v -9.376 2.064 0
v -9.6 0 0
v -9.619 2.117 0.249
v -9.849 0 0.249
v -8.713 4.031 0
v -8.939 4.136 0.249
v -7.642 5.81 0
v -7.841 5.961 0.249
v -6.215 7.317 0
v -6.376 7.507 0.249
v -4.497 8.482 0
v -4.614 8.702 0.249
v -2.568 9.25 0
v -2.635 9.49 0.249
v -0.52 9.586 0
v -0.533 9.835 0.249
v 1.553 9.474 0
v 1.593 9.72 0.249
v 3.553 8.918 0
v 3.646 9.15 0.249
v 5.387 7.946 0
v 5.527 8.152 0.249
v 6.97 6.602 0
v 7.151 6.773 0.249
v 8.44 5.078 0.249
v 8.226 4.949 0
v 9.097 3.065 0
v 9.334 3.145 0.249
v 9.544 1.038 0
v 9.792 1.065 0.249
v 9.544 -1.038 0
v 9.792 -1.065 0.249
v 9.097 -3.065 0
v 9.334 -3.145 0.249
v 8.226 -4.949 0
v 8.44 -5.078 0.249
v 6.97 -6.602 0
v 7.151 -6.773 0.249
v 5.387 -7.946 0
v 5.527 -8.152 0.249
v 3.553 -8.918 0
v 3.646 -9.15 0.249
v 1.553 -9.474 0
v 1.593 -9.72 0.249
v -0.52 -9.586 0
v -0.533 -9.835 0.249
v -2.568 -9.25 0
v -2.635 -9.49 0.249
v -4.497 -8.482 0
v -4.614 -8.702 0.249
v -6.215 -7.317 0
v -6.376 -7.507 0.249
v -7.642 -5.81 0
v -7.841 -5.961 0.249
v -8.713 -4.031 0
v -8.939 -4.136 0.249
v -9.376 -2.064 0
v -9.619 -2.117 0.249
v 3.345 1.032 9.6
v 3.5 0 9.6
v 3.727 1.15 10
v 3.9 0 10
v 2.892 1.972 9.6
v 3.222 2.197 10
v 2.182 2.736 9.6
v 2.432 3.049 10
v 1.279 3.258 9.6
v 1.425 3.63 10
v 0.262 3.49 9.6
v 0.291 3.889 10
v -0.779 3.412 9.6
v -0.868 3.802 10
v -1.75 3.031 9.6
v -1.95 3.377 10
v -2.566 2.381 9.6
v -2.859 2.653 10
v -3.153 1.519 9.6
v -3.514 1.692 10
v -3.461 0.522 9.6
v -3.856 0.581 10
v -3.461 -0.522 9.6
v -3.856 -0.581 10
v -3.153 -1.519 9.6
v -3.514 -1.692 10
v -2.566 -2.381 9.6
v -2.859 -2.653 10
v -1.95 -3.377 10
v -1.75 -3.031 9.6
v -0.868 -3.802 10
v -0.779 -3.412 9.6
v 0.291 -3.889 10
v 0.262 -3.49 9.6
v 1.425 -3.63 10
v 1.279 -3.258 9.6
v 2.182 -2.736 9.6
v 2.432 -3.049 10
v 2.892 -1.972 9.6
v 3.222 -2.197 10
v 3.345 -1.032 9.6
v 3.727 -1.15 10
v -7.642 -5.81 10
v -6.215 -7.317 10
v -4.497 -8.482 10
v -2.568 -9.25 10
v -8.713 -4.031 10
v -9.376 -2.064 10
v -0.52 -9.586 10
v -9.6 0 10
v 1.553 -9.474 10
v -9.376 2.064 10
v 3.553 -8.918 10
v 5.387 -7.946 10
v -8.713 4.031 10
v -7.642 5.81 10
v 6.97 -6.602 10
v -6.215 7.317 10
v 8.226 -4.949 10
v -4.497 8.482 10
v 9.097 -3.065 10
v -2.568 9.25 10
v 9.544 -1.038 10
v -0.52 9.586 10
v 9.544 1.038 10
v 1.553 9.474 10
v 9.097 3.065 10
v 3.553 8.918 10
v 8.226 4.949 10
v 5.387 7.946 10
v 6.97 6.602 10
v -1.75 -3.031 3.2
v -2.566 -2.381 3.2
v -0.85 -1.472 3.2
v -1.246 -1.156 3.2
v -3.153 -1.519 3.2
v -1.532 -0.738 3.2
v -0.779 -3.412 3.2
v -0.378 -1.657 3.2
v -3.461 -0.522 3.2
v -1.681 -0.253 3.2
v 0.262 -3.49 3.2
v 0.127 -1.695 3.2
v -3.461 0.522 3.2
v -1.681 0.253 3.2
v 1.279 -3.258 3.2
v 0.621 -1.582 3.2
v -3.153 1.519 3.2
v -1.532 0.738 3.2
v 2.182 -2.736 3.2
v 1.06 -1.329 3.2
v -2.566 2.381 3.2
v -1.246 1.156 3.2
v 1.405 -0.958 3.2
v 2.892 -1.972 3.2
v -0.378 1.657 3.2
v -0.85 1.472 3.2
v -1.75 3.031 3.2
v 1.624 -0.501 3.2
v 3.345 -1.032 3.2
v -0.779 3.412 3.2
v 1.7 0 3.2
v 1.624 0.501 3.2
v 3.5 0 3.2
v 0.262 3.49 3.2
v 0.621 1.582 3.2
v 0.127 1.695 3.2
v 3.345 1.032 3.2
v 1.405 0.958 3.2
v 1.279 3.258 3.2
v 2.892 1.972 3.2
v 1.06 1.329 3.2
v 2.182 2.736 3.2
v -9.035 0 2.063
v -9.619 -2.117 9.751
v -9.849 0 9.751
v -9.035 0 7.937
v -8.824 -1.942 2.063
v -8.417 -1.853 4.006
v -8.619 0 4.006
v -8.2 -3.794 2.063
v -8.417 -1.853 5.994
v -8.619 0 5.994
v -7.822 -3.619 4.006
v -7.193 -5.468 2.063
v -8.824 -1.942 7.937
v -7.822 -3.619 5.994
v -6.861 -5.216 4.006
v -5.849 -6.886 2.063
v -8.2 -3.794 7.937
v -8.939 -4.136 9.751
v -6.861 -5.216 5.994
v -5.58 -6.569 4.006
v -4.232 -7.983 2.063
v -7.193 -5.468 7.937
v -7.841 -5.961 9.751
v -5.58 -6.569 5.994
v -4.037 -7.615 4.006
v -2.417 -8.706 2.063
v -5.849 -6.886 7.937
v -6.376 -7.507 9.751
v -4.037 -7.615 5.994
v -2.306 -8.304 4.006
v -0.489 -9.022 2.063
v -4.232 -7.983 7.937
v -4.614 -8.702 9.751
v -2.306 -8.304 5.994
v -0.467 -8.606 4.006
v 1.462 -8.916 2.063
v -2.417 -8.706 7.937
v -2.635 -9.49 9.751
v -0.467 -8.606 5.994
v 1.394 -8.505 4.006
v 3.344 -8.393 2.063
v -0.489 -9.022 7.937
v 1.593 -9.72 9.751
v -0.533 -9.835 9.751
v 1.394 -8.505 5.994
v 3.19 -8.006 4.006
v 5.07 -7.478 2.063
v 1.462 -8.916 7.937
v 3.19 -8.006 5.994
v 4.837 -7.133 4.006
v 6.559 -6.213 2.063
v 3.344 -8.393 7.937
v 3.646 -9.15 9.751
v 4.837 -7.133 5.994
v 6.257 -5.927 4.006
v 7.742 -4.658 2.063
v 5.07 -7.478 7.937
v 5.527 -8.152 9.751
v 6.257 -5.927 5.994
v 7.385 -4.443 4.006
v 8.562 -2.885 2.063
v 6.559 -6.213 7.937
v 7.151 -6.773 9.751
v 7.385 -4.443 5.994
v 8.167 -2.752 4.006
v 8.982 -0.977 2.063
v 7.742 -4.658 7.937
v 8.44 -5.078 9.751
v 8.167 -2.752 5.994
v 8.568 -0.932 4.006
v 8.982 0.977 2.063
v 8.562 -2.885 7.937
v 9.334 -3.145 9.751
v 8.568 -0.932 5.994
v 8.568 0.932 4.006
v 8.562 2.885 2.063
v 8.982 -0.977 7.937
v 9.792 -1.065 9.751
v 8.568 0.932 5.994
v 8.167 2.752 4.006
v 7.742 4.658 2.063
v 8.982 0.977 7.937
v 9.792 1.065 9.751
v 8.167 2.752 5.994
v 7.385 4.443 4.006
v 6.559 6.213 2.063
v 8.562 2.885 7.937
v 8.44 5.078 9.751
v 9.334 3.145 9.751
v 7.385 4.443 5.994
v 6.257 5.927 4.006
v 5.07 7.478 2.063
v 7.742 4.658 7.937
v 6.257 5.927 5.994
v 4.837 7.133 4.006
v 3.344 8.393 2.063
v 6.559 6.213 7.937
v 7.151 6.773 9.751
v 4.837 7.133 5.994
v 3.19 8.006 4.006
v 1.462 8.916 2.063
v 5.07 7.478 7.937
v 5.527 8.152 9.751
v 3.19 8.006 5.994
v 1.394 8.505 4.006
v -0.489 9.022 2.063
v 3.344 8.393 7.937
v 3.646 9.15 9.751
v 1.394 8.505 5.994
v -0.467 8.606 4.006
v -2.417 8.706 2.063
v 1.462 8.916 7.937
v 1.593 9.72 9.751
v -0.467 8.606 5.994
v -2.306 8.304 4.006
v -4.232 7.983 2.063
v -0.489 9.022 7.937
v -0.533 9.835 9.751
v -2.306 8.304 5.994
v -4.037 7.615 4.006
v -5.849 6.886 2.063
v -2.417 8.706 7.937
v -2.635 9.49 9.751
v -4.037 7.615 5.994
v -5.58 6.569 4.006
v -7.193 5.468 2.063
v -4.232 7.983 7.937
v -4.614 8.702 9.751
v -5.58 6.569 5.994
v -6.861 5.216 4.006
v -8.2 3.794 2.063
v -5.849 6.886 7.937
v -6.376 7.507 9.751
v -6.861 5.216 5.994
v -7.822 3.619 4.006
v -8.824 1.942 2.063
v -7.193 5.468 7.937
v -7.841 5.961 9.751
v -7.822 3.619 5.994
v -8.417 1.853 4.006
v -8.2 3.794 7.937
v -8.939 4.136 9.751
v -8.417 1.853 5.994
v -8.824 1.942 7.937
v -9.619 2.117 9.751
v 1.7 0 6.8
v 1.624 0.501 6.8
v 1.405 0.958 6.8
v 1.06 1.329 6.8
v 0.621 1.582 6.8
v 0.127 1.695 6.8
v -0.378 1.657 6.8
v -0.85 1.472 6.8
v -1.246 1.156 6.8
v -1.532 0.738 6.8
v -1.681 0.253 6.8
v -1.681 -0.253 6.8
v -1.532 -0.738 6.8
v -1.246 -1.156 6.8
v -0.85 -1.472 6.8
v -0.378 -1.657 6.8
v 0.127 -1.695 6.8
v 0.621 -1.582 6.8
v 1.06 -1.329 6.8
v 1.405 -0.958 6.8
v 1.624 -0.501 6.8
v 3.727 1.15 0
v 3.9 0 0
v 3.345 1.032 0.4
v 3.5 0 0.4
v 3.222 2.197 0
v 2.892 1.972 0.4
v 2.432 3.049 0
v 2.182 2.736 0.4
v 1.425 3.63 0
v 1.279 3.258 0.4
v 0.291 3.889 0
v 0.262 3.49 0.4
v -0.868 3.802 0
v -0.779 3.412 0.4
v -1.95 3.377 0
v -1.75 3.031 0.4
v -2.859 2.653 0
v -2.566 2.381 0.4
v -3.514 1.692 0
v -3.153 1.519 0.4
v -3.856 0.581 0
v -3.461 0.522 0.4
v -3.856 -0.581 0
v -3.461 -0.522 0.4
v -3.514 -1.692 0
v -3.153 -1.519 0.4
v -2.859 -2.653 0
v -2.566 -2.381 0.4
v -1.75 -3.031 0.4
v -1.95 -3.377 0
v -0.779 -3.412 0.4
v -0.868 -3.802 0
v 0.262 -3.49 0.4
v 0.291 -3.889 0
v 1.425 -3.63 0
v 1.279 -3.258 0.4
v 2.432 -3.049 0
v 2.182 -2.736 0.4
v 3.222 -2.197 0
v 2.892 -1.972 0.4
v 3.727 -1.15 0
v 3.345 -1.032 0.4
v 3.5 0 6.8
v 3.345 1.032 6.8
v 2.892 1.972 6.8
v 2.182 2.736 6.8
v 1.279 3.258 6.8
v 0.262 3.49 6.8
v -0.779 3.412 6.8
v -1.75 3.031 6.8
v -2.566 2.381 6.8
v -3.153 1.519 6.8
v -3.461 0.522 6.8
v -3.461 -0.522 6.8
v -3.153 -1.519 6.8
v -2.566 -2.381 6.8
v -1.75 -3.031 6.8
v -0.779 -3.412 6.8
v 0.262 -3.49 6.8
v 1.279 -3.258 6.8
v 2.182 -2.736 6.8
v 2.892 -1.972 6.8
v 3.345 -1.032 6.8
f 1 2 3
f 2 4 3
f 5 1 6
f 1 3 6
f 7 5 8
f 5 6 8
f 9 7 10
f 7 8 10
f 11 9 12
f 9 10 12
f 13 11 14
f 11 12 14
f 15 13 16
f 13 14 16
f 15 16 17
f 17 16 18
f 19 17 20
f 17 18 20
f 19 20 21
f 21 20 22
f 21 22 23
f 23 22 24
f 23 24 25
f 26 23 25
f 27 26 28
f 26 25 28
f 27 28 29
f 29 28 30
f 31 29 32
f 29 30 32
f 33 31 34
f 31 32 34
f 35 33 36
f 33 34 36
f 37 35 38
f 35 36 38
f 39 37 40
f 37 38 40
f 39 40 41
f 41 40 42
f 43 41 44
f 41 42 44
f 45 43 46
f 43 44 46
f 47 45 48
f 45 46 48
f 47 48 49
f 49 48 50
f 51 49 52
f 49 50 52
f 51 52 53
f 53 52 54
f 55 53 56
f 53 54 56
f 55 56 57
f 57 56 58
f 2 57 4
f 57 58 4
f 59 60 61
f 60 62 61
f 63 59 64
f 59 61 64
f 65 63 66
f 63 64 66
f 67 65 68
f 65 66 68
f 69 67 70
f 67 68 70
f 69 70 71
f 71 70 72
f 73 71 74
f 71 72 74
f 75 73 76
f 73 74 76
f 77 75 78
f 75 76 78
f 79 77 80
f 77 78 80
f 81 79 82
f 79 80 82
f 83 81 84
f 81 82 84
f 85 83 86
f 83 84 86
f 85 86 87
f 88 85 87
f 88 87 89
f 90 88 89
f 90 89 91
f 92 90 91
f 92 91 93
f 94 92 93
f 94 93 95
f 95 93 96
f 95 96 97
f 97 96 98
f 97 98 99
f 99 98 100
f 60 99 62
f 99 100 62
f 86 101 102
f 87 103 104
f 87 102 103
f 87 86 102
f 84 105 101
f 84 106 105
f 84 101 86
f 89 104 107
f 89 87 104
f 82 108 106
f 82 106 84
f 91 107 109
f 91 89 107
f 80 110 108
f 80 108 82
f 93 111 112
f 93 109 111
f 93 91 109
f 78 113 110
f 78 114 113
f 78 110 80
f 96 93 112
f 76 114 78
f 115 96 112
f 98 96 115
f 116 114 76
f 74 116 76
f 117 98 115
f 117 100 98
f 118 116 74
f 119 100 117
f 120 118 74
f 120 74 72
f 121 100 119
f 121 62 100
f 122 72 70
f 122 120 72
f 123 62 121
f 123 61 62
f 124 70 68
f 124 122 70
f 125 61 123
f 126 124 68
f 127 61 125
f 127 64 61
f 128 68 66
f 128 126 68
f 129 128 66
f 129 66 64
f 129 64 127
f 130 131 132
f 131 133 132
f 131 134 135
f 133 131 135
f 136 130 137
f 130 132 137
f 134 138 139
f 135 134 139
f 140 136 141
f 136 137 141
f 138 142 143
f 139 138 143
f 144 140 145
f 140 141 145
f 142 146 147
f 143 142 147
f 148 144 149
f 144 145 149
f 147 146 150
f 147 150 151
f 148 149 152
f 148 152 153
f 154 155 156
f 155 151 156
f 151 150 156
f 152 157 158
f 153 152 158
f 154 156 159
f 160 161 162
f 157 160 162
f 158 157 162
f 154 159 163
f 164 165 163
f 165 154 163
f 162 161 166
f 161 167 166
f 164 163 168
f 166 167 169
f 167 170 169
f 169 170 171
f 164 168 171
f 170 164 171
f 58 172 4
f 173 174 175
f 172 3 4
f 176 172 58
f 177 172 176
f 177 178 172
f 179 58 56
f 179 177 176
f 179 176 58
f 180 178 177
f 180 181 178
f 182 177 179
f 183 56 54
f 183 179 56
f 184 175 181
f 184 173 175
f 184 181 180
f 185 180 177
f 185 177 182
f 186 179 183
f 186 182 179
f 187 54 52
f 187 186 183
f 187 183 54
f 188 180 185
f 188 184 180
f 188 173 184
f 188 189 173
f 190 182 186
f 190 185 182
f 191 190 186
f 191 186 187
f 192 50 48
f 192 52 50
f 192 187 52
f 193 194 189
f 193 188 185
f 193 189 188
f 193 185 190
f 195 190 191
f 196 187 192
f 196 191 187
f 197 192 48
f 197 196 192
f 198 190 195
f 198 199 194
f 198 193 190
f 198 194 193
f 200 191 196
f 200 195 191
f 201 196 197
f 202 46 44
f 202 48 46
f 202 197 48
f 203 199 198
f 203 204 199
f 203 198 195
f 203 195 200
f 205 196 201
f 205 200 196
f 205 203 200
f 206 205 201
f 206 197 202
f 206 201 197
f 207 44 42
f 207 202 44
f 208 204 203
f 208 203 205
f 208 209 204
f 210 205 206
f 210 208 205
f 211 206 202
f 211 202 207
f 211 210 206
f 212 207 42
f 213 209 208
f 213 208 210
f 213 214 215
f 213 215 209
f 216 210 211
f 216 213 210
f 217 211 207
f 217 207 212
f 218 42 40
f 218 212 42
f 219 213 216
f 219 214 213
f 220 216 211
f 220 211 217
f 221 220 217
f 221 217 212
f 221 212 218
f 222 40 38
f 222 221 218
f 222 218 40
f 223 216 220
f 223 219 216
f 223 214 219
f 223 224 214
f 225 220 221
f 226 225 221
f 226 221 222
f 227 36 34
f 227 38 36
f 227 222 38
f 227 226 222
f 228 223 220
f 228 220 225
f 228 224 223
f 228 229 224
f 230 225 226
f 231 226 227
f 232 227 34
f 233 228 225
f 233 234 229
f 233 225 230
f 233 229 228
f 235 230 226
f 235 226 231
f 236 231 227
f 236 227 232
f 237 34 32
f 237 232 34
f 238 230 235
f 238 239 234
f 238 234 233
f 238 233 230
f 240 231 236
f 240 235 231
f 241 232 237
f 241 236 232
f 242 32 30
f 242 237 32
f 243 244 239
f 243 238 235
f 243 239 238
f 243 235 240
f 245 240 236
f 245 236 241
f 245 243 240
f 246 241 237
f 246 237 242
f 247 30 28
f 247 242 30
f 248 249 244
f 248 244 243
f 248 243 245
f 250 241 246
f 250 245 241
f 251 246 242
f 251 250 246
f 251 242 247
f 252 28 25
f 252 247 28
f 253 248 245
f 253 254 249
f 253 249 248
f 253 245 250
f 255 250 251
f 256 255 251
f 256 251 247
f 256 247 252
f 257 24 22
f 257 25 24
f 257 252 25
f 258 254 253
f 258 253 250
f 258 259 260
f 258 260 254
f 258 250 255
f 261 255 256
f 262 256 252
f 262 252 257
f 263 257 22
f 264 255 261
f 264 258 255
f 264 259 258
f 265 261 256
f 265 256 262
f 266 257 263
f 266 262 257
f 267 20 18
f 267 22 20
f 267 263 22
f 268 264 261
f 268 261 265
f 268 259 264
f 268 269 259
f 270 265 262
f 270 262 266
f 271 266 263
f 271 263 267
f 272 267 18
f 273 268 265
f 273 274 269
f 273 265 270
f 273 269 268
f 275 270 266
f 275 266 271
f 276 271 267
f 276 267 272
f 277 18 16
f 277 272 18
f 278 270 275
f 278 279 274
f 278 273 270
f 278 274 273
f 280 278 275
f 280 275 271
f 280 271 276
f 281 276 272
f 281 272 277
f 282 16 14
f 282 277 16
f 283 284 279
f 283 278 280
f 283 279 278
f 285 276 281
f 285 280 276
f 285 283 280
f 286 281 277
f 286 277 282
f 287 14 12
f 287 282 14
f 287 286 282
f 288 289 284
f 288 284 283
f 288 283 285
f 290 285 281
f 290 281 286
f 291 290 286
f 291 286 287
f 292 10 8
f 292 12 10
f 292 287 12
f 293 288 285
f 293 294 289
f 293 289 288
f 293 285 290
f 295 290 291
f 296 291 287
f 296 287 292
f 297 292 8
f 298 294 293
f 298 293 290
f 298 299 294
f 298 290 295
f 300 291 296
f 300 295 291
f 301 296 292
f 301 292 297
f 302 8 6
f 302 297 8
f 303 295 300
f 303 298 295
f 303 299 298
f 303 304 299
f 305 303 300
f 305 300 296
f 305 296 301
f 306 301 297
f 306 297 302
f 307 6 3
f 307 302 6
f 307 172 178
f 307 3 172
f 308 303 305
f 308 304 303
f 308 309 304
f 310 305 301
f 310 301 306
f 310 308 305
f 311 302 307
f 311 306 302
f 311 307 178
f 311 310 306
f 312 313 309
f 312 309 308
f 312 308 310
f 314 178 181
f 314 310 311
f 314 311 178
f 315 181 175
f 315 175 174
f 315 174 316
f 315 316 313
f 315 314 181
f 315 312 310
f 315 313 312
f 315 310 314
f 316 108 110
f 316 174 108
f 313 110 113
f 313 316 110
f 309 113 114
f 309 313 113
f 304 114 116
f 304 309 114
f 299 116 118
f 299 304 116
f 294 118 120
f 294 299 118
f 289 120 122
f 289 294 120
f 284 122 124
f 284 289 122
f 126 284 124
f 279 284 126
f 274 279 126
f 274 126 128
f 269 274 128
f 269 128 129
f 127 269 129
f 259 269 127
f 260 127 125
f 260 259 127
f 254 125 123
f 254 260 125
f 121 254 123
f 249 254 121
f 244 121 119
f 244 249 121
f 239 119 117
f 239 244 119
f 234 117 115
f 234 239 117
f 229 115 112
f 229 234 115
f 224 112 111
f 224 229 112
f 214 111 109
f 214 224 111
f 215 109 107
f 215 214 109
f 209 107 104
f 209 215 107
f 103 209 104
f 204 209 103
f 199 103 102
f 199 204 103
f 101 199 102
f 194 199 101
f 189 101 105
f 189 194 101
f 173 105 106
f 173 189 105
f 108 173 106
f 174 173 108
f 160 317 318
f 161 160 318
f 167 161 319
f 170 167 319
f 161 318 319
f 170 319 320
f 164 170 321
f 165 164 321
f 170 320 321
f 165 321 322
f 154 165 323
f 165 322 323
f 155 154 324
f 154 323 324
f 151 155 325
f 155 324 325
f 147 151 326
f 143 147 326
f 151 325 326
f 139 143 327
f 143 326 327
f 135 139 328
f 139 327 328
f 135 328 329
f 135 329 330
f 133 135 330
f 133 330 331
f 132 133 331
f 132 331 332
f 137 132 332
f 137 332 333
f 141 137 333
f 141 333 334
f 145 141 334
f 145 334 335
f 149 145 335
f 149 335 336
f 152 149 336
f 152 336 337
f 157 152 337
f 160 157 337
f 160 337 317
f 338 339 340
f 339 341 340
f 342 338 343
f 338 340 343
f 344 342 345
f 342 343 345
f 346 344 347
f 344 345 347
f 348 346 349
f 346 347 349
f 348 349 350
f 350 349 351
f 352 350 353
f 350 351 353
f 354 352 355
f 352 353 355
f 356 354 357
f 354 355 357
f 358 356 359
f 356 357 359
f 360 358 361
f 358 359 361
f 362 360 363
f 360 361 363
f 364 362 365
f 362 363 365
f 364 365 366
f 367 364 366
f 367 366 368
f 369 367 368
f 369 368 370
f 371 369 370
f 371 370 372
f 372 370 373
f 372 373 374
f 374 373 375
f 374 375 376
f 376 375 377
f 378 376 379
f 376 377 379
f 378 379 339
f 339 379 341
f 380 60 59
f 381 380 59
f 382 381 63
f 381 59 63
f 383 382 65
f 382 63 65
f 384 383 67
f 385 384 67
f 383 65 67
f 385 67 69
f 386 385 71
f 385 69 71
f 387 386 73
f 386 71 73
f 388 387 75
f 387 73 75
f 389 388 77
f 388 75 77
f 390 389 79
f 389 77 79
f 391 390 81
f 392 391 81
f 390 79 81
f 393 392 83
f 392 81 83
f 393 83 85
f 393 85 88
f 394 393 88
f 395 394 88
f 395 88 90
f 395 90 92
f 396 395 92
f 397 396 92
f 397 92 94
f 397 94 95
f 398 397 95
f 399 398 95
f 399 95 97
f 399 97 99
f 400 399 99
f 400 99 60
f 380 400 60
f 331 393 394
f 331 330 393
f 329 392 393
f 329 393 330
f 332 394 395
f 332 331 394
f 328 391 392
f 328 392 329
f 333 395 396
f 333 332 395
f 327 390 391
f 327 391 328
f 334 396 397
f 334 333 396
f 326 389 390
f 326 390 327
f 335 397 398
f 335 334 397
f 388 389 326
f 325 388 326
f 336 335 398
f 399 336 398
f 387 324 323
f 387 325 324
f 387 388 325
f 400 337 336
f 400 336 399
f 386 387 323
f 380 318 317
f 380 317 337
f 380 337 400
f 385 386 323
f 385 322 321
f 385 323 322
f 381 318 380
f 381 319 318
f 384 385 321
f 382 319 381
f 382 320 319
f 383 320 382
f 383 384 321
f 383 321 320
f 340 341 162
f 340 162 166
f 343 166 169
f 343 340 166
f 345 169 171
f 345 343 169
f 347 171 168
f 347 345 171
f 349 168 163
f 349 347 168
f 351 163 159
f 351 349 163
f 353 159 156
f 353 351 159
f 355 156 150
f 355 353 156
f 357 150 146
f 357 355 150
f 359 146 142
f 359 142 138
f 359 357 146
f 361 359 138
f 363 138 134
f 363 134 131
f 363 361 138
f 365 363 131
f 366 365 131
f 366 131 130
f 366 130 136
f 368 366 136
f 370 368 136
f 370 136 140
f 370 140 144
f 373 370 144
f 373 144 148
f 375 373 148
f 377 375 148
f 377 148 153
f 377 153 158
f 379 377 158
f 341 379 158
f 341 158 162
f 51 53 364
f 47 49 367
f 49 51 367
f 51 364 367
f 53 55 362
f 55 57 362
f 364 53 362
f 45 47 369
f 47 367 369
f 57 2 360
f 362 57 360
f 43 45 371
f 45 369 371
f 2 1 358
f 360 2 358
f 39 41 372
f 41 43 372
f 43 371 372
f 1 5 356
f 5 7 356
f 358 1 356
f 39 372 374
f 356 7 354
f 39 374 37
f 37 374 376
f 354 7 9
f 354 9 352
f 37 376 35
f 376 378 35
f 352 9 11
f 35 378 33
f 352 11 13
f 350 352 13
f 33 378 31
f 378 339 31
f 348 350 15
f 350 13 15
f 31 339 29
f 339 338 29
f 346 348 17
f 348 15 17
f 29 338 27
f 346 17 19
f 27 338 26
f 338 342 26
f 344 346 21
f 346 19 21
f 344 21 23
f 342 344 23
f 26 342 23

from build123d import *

# Parameters (mm, degrees)
SKETCH1_R           = 10
BOSS_EXTRUDE1_DEPTH = 10
CUT_EXTRUDE1_REACH  = 19.321
SKETCH2_R           = 1.7
SKETCH3_R           = 3.5
CUT_EXTRUDE2_DEPTH  = 3.2
CHAMFER1_SIZE       = 0.4
CHAMFER2_SIZE       = 0.4


with BuildPart() as part:
    # Sketch1 → Boss-Extrude1 (new body)
    with BuildSketch(Plane.XY):
        Circle(SKETCH1_R)
    extrude(amount=BOSS_EXTRUDE1_DEPTH)

    # Sketch2 → Cut-Extrude1 (cut, up to next)
    with BuildSketch(Plane.XY.offset(10), mode=Mode.PRIVATE) as cut_extrude1_sk1:
        Circle(SKETCH2_R)
    cut_extrude1_tool1 = extrude(cut_extrude1_sk1.sketch, amount=-CUT_EXTRUDE1_REACH, mode=Mode.PRIVATE) & part.part
    add(cut_extrude1_tool1.solids().sort_by_distance((0, 0, 10))[0], mode=Mode.SUBTRACT)

    # Sketch3 → Cut-Extrude2 (cut)
    with BuildSketch(Plane.XY.offset(10)):
        Circle(SKETCH3_R)
    cut_extrude2 = extrude(amount=-CUT_EXTRUDE2_DEPTH, mode=Mode.SUBTRACT)

    # Mirror1: Cut-Extrude2 across plane
    add(cut_extrude2.mirror(Plane.XY.offset(5)), mode=Mode.SUBTRACT)

    # Sketch4 → Cut-Revolve1 (revolve, cut)
    with BuildSketch(Plane(origin=(0, 0, 0), x_dir=(1, 0, 0), z_dir=(0, 1, 0)), mode=Mode.PRIVATE) as cut_revolve1_sk:
        with BuildLine():
            Line((10, -10), (10, 0))
            ThreePointArc((10, 0), (8.566018868, -5), (10, -10))
        make_face()
    revolve(cut_revolve1_sk.sketch.rotate(Axis((0, 0, 3.2), (0, 0, 1)), 180), axis=Axis((0, 0, 3.2), (0, 0, 1)), mode=Mode.SUBTRACT)

    # Chamfer1
    # the kernel refuses this chamfer: 0.4, 0.290276343 mm, written as the material it takes off along each edge
    with BuildSketch(Plane(origin=(0, 0, 10), x_dir=(1, 0, 0), z_dir=(0, -1, 0))) as chamfer1_piece_1:
        Polygon((3.5, -CHAMFER1_SIZE), (3.5 + CHAMFER1_SIZE, 0), (3.5, 0), align=None)
    revolve(axis=Axis((0, 0, 10), (0, 0, 1)), mode=Mode.SUBTRACT)
    with BuildSketch(Plane(origin=(0, 0, 0), x_dir=(1, 0, 0), z_dir=(0, -1, 0))) as chamfer1_piece_2:
        Polygon((3.5 + CHAMFER1_SIZE, 0), (3.5, CHAMFER1_SIZE), (3.5, 0), align=None)
    revolve(axis=Axis((0, 0, 0), (0, 0, 1)), mode=Mode.SUBTRACT)
    with BuildSketch(Plane(origin=(0, 0, 10), x_dir=(-1, 0, 0), z_dir=(0, -1, 0))) as chamfer1_piece_3:
        with BuildLine():
            Line((10 - CHAMFER1_SIZE, 0), (9.849418631, 0.249418631))
            ThreePointArc((9.849418631, 0.249418631), (9.922753807, 0.125772477), (10, 0))
            Line((10, 0), (10 - CHAMFER1_SIZE, 0))
        make_face()
    revolve(axis=Axis((0, 0, 10), (0, 0, -1)), mode=Mode.SUBTRACT)

    # Chamfer2
    # the kernel refuses this chamfer: 0.4, 0.290276343 mm, written as the material it takes off along each edge
    with BuildSketch(Plane(origin=(0, 0, 0), x_dir=(-1, 0, 0), z_dir=(0, -1, 0))) as chamfer2_piece_1:
        with BuildLine():
            Line((10 - CHAMFER2_SIZE, 0), (9.849418631, -0.249418631))
            ThreePointArc((9.849418631, -0.249418631), (9.922753807, -0.125772477), (10, 0))
            Line((10, 0), (10 - CHAMFER2_SIZE, 0))
        make_face()
    revolve(axis=Axis((0, 0, 0), (0, 0, -1)), mode=Mode.SUBTRACT)


solid = part.part
